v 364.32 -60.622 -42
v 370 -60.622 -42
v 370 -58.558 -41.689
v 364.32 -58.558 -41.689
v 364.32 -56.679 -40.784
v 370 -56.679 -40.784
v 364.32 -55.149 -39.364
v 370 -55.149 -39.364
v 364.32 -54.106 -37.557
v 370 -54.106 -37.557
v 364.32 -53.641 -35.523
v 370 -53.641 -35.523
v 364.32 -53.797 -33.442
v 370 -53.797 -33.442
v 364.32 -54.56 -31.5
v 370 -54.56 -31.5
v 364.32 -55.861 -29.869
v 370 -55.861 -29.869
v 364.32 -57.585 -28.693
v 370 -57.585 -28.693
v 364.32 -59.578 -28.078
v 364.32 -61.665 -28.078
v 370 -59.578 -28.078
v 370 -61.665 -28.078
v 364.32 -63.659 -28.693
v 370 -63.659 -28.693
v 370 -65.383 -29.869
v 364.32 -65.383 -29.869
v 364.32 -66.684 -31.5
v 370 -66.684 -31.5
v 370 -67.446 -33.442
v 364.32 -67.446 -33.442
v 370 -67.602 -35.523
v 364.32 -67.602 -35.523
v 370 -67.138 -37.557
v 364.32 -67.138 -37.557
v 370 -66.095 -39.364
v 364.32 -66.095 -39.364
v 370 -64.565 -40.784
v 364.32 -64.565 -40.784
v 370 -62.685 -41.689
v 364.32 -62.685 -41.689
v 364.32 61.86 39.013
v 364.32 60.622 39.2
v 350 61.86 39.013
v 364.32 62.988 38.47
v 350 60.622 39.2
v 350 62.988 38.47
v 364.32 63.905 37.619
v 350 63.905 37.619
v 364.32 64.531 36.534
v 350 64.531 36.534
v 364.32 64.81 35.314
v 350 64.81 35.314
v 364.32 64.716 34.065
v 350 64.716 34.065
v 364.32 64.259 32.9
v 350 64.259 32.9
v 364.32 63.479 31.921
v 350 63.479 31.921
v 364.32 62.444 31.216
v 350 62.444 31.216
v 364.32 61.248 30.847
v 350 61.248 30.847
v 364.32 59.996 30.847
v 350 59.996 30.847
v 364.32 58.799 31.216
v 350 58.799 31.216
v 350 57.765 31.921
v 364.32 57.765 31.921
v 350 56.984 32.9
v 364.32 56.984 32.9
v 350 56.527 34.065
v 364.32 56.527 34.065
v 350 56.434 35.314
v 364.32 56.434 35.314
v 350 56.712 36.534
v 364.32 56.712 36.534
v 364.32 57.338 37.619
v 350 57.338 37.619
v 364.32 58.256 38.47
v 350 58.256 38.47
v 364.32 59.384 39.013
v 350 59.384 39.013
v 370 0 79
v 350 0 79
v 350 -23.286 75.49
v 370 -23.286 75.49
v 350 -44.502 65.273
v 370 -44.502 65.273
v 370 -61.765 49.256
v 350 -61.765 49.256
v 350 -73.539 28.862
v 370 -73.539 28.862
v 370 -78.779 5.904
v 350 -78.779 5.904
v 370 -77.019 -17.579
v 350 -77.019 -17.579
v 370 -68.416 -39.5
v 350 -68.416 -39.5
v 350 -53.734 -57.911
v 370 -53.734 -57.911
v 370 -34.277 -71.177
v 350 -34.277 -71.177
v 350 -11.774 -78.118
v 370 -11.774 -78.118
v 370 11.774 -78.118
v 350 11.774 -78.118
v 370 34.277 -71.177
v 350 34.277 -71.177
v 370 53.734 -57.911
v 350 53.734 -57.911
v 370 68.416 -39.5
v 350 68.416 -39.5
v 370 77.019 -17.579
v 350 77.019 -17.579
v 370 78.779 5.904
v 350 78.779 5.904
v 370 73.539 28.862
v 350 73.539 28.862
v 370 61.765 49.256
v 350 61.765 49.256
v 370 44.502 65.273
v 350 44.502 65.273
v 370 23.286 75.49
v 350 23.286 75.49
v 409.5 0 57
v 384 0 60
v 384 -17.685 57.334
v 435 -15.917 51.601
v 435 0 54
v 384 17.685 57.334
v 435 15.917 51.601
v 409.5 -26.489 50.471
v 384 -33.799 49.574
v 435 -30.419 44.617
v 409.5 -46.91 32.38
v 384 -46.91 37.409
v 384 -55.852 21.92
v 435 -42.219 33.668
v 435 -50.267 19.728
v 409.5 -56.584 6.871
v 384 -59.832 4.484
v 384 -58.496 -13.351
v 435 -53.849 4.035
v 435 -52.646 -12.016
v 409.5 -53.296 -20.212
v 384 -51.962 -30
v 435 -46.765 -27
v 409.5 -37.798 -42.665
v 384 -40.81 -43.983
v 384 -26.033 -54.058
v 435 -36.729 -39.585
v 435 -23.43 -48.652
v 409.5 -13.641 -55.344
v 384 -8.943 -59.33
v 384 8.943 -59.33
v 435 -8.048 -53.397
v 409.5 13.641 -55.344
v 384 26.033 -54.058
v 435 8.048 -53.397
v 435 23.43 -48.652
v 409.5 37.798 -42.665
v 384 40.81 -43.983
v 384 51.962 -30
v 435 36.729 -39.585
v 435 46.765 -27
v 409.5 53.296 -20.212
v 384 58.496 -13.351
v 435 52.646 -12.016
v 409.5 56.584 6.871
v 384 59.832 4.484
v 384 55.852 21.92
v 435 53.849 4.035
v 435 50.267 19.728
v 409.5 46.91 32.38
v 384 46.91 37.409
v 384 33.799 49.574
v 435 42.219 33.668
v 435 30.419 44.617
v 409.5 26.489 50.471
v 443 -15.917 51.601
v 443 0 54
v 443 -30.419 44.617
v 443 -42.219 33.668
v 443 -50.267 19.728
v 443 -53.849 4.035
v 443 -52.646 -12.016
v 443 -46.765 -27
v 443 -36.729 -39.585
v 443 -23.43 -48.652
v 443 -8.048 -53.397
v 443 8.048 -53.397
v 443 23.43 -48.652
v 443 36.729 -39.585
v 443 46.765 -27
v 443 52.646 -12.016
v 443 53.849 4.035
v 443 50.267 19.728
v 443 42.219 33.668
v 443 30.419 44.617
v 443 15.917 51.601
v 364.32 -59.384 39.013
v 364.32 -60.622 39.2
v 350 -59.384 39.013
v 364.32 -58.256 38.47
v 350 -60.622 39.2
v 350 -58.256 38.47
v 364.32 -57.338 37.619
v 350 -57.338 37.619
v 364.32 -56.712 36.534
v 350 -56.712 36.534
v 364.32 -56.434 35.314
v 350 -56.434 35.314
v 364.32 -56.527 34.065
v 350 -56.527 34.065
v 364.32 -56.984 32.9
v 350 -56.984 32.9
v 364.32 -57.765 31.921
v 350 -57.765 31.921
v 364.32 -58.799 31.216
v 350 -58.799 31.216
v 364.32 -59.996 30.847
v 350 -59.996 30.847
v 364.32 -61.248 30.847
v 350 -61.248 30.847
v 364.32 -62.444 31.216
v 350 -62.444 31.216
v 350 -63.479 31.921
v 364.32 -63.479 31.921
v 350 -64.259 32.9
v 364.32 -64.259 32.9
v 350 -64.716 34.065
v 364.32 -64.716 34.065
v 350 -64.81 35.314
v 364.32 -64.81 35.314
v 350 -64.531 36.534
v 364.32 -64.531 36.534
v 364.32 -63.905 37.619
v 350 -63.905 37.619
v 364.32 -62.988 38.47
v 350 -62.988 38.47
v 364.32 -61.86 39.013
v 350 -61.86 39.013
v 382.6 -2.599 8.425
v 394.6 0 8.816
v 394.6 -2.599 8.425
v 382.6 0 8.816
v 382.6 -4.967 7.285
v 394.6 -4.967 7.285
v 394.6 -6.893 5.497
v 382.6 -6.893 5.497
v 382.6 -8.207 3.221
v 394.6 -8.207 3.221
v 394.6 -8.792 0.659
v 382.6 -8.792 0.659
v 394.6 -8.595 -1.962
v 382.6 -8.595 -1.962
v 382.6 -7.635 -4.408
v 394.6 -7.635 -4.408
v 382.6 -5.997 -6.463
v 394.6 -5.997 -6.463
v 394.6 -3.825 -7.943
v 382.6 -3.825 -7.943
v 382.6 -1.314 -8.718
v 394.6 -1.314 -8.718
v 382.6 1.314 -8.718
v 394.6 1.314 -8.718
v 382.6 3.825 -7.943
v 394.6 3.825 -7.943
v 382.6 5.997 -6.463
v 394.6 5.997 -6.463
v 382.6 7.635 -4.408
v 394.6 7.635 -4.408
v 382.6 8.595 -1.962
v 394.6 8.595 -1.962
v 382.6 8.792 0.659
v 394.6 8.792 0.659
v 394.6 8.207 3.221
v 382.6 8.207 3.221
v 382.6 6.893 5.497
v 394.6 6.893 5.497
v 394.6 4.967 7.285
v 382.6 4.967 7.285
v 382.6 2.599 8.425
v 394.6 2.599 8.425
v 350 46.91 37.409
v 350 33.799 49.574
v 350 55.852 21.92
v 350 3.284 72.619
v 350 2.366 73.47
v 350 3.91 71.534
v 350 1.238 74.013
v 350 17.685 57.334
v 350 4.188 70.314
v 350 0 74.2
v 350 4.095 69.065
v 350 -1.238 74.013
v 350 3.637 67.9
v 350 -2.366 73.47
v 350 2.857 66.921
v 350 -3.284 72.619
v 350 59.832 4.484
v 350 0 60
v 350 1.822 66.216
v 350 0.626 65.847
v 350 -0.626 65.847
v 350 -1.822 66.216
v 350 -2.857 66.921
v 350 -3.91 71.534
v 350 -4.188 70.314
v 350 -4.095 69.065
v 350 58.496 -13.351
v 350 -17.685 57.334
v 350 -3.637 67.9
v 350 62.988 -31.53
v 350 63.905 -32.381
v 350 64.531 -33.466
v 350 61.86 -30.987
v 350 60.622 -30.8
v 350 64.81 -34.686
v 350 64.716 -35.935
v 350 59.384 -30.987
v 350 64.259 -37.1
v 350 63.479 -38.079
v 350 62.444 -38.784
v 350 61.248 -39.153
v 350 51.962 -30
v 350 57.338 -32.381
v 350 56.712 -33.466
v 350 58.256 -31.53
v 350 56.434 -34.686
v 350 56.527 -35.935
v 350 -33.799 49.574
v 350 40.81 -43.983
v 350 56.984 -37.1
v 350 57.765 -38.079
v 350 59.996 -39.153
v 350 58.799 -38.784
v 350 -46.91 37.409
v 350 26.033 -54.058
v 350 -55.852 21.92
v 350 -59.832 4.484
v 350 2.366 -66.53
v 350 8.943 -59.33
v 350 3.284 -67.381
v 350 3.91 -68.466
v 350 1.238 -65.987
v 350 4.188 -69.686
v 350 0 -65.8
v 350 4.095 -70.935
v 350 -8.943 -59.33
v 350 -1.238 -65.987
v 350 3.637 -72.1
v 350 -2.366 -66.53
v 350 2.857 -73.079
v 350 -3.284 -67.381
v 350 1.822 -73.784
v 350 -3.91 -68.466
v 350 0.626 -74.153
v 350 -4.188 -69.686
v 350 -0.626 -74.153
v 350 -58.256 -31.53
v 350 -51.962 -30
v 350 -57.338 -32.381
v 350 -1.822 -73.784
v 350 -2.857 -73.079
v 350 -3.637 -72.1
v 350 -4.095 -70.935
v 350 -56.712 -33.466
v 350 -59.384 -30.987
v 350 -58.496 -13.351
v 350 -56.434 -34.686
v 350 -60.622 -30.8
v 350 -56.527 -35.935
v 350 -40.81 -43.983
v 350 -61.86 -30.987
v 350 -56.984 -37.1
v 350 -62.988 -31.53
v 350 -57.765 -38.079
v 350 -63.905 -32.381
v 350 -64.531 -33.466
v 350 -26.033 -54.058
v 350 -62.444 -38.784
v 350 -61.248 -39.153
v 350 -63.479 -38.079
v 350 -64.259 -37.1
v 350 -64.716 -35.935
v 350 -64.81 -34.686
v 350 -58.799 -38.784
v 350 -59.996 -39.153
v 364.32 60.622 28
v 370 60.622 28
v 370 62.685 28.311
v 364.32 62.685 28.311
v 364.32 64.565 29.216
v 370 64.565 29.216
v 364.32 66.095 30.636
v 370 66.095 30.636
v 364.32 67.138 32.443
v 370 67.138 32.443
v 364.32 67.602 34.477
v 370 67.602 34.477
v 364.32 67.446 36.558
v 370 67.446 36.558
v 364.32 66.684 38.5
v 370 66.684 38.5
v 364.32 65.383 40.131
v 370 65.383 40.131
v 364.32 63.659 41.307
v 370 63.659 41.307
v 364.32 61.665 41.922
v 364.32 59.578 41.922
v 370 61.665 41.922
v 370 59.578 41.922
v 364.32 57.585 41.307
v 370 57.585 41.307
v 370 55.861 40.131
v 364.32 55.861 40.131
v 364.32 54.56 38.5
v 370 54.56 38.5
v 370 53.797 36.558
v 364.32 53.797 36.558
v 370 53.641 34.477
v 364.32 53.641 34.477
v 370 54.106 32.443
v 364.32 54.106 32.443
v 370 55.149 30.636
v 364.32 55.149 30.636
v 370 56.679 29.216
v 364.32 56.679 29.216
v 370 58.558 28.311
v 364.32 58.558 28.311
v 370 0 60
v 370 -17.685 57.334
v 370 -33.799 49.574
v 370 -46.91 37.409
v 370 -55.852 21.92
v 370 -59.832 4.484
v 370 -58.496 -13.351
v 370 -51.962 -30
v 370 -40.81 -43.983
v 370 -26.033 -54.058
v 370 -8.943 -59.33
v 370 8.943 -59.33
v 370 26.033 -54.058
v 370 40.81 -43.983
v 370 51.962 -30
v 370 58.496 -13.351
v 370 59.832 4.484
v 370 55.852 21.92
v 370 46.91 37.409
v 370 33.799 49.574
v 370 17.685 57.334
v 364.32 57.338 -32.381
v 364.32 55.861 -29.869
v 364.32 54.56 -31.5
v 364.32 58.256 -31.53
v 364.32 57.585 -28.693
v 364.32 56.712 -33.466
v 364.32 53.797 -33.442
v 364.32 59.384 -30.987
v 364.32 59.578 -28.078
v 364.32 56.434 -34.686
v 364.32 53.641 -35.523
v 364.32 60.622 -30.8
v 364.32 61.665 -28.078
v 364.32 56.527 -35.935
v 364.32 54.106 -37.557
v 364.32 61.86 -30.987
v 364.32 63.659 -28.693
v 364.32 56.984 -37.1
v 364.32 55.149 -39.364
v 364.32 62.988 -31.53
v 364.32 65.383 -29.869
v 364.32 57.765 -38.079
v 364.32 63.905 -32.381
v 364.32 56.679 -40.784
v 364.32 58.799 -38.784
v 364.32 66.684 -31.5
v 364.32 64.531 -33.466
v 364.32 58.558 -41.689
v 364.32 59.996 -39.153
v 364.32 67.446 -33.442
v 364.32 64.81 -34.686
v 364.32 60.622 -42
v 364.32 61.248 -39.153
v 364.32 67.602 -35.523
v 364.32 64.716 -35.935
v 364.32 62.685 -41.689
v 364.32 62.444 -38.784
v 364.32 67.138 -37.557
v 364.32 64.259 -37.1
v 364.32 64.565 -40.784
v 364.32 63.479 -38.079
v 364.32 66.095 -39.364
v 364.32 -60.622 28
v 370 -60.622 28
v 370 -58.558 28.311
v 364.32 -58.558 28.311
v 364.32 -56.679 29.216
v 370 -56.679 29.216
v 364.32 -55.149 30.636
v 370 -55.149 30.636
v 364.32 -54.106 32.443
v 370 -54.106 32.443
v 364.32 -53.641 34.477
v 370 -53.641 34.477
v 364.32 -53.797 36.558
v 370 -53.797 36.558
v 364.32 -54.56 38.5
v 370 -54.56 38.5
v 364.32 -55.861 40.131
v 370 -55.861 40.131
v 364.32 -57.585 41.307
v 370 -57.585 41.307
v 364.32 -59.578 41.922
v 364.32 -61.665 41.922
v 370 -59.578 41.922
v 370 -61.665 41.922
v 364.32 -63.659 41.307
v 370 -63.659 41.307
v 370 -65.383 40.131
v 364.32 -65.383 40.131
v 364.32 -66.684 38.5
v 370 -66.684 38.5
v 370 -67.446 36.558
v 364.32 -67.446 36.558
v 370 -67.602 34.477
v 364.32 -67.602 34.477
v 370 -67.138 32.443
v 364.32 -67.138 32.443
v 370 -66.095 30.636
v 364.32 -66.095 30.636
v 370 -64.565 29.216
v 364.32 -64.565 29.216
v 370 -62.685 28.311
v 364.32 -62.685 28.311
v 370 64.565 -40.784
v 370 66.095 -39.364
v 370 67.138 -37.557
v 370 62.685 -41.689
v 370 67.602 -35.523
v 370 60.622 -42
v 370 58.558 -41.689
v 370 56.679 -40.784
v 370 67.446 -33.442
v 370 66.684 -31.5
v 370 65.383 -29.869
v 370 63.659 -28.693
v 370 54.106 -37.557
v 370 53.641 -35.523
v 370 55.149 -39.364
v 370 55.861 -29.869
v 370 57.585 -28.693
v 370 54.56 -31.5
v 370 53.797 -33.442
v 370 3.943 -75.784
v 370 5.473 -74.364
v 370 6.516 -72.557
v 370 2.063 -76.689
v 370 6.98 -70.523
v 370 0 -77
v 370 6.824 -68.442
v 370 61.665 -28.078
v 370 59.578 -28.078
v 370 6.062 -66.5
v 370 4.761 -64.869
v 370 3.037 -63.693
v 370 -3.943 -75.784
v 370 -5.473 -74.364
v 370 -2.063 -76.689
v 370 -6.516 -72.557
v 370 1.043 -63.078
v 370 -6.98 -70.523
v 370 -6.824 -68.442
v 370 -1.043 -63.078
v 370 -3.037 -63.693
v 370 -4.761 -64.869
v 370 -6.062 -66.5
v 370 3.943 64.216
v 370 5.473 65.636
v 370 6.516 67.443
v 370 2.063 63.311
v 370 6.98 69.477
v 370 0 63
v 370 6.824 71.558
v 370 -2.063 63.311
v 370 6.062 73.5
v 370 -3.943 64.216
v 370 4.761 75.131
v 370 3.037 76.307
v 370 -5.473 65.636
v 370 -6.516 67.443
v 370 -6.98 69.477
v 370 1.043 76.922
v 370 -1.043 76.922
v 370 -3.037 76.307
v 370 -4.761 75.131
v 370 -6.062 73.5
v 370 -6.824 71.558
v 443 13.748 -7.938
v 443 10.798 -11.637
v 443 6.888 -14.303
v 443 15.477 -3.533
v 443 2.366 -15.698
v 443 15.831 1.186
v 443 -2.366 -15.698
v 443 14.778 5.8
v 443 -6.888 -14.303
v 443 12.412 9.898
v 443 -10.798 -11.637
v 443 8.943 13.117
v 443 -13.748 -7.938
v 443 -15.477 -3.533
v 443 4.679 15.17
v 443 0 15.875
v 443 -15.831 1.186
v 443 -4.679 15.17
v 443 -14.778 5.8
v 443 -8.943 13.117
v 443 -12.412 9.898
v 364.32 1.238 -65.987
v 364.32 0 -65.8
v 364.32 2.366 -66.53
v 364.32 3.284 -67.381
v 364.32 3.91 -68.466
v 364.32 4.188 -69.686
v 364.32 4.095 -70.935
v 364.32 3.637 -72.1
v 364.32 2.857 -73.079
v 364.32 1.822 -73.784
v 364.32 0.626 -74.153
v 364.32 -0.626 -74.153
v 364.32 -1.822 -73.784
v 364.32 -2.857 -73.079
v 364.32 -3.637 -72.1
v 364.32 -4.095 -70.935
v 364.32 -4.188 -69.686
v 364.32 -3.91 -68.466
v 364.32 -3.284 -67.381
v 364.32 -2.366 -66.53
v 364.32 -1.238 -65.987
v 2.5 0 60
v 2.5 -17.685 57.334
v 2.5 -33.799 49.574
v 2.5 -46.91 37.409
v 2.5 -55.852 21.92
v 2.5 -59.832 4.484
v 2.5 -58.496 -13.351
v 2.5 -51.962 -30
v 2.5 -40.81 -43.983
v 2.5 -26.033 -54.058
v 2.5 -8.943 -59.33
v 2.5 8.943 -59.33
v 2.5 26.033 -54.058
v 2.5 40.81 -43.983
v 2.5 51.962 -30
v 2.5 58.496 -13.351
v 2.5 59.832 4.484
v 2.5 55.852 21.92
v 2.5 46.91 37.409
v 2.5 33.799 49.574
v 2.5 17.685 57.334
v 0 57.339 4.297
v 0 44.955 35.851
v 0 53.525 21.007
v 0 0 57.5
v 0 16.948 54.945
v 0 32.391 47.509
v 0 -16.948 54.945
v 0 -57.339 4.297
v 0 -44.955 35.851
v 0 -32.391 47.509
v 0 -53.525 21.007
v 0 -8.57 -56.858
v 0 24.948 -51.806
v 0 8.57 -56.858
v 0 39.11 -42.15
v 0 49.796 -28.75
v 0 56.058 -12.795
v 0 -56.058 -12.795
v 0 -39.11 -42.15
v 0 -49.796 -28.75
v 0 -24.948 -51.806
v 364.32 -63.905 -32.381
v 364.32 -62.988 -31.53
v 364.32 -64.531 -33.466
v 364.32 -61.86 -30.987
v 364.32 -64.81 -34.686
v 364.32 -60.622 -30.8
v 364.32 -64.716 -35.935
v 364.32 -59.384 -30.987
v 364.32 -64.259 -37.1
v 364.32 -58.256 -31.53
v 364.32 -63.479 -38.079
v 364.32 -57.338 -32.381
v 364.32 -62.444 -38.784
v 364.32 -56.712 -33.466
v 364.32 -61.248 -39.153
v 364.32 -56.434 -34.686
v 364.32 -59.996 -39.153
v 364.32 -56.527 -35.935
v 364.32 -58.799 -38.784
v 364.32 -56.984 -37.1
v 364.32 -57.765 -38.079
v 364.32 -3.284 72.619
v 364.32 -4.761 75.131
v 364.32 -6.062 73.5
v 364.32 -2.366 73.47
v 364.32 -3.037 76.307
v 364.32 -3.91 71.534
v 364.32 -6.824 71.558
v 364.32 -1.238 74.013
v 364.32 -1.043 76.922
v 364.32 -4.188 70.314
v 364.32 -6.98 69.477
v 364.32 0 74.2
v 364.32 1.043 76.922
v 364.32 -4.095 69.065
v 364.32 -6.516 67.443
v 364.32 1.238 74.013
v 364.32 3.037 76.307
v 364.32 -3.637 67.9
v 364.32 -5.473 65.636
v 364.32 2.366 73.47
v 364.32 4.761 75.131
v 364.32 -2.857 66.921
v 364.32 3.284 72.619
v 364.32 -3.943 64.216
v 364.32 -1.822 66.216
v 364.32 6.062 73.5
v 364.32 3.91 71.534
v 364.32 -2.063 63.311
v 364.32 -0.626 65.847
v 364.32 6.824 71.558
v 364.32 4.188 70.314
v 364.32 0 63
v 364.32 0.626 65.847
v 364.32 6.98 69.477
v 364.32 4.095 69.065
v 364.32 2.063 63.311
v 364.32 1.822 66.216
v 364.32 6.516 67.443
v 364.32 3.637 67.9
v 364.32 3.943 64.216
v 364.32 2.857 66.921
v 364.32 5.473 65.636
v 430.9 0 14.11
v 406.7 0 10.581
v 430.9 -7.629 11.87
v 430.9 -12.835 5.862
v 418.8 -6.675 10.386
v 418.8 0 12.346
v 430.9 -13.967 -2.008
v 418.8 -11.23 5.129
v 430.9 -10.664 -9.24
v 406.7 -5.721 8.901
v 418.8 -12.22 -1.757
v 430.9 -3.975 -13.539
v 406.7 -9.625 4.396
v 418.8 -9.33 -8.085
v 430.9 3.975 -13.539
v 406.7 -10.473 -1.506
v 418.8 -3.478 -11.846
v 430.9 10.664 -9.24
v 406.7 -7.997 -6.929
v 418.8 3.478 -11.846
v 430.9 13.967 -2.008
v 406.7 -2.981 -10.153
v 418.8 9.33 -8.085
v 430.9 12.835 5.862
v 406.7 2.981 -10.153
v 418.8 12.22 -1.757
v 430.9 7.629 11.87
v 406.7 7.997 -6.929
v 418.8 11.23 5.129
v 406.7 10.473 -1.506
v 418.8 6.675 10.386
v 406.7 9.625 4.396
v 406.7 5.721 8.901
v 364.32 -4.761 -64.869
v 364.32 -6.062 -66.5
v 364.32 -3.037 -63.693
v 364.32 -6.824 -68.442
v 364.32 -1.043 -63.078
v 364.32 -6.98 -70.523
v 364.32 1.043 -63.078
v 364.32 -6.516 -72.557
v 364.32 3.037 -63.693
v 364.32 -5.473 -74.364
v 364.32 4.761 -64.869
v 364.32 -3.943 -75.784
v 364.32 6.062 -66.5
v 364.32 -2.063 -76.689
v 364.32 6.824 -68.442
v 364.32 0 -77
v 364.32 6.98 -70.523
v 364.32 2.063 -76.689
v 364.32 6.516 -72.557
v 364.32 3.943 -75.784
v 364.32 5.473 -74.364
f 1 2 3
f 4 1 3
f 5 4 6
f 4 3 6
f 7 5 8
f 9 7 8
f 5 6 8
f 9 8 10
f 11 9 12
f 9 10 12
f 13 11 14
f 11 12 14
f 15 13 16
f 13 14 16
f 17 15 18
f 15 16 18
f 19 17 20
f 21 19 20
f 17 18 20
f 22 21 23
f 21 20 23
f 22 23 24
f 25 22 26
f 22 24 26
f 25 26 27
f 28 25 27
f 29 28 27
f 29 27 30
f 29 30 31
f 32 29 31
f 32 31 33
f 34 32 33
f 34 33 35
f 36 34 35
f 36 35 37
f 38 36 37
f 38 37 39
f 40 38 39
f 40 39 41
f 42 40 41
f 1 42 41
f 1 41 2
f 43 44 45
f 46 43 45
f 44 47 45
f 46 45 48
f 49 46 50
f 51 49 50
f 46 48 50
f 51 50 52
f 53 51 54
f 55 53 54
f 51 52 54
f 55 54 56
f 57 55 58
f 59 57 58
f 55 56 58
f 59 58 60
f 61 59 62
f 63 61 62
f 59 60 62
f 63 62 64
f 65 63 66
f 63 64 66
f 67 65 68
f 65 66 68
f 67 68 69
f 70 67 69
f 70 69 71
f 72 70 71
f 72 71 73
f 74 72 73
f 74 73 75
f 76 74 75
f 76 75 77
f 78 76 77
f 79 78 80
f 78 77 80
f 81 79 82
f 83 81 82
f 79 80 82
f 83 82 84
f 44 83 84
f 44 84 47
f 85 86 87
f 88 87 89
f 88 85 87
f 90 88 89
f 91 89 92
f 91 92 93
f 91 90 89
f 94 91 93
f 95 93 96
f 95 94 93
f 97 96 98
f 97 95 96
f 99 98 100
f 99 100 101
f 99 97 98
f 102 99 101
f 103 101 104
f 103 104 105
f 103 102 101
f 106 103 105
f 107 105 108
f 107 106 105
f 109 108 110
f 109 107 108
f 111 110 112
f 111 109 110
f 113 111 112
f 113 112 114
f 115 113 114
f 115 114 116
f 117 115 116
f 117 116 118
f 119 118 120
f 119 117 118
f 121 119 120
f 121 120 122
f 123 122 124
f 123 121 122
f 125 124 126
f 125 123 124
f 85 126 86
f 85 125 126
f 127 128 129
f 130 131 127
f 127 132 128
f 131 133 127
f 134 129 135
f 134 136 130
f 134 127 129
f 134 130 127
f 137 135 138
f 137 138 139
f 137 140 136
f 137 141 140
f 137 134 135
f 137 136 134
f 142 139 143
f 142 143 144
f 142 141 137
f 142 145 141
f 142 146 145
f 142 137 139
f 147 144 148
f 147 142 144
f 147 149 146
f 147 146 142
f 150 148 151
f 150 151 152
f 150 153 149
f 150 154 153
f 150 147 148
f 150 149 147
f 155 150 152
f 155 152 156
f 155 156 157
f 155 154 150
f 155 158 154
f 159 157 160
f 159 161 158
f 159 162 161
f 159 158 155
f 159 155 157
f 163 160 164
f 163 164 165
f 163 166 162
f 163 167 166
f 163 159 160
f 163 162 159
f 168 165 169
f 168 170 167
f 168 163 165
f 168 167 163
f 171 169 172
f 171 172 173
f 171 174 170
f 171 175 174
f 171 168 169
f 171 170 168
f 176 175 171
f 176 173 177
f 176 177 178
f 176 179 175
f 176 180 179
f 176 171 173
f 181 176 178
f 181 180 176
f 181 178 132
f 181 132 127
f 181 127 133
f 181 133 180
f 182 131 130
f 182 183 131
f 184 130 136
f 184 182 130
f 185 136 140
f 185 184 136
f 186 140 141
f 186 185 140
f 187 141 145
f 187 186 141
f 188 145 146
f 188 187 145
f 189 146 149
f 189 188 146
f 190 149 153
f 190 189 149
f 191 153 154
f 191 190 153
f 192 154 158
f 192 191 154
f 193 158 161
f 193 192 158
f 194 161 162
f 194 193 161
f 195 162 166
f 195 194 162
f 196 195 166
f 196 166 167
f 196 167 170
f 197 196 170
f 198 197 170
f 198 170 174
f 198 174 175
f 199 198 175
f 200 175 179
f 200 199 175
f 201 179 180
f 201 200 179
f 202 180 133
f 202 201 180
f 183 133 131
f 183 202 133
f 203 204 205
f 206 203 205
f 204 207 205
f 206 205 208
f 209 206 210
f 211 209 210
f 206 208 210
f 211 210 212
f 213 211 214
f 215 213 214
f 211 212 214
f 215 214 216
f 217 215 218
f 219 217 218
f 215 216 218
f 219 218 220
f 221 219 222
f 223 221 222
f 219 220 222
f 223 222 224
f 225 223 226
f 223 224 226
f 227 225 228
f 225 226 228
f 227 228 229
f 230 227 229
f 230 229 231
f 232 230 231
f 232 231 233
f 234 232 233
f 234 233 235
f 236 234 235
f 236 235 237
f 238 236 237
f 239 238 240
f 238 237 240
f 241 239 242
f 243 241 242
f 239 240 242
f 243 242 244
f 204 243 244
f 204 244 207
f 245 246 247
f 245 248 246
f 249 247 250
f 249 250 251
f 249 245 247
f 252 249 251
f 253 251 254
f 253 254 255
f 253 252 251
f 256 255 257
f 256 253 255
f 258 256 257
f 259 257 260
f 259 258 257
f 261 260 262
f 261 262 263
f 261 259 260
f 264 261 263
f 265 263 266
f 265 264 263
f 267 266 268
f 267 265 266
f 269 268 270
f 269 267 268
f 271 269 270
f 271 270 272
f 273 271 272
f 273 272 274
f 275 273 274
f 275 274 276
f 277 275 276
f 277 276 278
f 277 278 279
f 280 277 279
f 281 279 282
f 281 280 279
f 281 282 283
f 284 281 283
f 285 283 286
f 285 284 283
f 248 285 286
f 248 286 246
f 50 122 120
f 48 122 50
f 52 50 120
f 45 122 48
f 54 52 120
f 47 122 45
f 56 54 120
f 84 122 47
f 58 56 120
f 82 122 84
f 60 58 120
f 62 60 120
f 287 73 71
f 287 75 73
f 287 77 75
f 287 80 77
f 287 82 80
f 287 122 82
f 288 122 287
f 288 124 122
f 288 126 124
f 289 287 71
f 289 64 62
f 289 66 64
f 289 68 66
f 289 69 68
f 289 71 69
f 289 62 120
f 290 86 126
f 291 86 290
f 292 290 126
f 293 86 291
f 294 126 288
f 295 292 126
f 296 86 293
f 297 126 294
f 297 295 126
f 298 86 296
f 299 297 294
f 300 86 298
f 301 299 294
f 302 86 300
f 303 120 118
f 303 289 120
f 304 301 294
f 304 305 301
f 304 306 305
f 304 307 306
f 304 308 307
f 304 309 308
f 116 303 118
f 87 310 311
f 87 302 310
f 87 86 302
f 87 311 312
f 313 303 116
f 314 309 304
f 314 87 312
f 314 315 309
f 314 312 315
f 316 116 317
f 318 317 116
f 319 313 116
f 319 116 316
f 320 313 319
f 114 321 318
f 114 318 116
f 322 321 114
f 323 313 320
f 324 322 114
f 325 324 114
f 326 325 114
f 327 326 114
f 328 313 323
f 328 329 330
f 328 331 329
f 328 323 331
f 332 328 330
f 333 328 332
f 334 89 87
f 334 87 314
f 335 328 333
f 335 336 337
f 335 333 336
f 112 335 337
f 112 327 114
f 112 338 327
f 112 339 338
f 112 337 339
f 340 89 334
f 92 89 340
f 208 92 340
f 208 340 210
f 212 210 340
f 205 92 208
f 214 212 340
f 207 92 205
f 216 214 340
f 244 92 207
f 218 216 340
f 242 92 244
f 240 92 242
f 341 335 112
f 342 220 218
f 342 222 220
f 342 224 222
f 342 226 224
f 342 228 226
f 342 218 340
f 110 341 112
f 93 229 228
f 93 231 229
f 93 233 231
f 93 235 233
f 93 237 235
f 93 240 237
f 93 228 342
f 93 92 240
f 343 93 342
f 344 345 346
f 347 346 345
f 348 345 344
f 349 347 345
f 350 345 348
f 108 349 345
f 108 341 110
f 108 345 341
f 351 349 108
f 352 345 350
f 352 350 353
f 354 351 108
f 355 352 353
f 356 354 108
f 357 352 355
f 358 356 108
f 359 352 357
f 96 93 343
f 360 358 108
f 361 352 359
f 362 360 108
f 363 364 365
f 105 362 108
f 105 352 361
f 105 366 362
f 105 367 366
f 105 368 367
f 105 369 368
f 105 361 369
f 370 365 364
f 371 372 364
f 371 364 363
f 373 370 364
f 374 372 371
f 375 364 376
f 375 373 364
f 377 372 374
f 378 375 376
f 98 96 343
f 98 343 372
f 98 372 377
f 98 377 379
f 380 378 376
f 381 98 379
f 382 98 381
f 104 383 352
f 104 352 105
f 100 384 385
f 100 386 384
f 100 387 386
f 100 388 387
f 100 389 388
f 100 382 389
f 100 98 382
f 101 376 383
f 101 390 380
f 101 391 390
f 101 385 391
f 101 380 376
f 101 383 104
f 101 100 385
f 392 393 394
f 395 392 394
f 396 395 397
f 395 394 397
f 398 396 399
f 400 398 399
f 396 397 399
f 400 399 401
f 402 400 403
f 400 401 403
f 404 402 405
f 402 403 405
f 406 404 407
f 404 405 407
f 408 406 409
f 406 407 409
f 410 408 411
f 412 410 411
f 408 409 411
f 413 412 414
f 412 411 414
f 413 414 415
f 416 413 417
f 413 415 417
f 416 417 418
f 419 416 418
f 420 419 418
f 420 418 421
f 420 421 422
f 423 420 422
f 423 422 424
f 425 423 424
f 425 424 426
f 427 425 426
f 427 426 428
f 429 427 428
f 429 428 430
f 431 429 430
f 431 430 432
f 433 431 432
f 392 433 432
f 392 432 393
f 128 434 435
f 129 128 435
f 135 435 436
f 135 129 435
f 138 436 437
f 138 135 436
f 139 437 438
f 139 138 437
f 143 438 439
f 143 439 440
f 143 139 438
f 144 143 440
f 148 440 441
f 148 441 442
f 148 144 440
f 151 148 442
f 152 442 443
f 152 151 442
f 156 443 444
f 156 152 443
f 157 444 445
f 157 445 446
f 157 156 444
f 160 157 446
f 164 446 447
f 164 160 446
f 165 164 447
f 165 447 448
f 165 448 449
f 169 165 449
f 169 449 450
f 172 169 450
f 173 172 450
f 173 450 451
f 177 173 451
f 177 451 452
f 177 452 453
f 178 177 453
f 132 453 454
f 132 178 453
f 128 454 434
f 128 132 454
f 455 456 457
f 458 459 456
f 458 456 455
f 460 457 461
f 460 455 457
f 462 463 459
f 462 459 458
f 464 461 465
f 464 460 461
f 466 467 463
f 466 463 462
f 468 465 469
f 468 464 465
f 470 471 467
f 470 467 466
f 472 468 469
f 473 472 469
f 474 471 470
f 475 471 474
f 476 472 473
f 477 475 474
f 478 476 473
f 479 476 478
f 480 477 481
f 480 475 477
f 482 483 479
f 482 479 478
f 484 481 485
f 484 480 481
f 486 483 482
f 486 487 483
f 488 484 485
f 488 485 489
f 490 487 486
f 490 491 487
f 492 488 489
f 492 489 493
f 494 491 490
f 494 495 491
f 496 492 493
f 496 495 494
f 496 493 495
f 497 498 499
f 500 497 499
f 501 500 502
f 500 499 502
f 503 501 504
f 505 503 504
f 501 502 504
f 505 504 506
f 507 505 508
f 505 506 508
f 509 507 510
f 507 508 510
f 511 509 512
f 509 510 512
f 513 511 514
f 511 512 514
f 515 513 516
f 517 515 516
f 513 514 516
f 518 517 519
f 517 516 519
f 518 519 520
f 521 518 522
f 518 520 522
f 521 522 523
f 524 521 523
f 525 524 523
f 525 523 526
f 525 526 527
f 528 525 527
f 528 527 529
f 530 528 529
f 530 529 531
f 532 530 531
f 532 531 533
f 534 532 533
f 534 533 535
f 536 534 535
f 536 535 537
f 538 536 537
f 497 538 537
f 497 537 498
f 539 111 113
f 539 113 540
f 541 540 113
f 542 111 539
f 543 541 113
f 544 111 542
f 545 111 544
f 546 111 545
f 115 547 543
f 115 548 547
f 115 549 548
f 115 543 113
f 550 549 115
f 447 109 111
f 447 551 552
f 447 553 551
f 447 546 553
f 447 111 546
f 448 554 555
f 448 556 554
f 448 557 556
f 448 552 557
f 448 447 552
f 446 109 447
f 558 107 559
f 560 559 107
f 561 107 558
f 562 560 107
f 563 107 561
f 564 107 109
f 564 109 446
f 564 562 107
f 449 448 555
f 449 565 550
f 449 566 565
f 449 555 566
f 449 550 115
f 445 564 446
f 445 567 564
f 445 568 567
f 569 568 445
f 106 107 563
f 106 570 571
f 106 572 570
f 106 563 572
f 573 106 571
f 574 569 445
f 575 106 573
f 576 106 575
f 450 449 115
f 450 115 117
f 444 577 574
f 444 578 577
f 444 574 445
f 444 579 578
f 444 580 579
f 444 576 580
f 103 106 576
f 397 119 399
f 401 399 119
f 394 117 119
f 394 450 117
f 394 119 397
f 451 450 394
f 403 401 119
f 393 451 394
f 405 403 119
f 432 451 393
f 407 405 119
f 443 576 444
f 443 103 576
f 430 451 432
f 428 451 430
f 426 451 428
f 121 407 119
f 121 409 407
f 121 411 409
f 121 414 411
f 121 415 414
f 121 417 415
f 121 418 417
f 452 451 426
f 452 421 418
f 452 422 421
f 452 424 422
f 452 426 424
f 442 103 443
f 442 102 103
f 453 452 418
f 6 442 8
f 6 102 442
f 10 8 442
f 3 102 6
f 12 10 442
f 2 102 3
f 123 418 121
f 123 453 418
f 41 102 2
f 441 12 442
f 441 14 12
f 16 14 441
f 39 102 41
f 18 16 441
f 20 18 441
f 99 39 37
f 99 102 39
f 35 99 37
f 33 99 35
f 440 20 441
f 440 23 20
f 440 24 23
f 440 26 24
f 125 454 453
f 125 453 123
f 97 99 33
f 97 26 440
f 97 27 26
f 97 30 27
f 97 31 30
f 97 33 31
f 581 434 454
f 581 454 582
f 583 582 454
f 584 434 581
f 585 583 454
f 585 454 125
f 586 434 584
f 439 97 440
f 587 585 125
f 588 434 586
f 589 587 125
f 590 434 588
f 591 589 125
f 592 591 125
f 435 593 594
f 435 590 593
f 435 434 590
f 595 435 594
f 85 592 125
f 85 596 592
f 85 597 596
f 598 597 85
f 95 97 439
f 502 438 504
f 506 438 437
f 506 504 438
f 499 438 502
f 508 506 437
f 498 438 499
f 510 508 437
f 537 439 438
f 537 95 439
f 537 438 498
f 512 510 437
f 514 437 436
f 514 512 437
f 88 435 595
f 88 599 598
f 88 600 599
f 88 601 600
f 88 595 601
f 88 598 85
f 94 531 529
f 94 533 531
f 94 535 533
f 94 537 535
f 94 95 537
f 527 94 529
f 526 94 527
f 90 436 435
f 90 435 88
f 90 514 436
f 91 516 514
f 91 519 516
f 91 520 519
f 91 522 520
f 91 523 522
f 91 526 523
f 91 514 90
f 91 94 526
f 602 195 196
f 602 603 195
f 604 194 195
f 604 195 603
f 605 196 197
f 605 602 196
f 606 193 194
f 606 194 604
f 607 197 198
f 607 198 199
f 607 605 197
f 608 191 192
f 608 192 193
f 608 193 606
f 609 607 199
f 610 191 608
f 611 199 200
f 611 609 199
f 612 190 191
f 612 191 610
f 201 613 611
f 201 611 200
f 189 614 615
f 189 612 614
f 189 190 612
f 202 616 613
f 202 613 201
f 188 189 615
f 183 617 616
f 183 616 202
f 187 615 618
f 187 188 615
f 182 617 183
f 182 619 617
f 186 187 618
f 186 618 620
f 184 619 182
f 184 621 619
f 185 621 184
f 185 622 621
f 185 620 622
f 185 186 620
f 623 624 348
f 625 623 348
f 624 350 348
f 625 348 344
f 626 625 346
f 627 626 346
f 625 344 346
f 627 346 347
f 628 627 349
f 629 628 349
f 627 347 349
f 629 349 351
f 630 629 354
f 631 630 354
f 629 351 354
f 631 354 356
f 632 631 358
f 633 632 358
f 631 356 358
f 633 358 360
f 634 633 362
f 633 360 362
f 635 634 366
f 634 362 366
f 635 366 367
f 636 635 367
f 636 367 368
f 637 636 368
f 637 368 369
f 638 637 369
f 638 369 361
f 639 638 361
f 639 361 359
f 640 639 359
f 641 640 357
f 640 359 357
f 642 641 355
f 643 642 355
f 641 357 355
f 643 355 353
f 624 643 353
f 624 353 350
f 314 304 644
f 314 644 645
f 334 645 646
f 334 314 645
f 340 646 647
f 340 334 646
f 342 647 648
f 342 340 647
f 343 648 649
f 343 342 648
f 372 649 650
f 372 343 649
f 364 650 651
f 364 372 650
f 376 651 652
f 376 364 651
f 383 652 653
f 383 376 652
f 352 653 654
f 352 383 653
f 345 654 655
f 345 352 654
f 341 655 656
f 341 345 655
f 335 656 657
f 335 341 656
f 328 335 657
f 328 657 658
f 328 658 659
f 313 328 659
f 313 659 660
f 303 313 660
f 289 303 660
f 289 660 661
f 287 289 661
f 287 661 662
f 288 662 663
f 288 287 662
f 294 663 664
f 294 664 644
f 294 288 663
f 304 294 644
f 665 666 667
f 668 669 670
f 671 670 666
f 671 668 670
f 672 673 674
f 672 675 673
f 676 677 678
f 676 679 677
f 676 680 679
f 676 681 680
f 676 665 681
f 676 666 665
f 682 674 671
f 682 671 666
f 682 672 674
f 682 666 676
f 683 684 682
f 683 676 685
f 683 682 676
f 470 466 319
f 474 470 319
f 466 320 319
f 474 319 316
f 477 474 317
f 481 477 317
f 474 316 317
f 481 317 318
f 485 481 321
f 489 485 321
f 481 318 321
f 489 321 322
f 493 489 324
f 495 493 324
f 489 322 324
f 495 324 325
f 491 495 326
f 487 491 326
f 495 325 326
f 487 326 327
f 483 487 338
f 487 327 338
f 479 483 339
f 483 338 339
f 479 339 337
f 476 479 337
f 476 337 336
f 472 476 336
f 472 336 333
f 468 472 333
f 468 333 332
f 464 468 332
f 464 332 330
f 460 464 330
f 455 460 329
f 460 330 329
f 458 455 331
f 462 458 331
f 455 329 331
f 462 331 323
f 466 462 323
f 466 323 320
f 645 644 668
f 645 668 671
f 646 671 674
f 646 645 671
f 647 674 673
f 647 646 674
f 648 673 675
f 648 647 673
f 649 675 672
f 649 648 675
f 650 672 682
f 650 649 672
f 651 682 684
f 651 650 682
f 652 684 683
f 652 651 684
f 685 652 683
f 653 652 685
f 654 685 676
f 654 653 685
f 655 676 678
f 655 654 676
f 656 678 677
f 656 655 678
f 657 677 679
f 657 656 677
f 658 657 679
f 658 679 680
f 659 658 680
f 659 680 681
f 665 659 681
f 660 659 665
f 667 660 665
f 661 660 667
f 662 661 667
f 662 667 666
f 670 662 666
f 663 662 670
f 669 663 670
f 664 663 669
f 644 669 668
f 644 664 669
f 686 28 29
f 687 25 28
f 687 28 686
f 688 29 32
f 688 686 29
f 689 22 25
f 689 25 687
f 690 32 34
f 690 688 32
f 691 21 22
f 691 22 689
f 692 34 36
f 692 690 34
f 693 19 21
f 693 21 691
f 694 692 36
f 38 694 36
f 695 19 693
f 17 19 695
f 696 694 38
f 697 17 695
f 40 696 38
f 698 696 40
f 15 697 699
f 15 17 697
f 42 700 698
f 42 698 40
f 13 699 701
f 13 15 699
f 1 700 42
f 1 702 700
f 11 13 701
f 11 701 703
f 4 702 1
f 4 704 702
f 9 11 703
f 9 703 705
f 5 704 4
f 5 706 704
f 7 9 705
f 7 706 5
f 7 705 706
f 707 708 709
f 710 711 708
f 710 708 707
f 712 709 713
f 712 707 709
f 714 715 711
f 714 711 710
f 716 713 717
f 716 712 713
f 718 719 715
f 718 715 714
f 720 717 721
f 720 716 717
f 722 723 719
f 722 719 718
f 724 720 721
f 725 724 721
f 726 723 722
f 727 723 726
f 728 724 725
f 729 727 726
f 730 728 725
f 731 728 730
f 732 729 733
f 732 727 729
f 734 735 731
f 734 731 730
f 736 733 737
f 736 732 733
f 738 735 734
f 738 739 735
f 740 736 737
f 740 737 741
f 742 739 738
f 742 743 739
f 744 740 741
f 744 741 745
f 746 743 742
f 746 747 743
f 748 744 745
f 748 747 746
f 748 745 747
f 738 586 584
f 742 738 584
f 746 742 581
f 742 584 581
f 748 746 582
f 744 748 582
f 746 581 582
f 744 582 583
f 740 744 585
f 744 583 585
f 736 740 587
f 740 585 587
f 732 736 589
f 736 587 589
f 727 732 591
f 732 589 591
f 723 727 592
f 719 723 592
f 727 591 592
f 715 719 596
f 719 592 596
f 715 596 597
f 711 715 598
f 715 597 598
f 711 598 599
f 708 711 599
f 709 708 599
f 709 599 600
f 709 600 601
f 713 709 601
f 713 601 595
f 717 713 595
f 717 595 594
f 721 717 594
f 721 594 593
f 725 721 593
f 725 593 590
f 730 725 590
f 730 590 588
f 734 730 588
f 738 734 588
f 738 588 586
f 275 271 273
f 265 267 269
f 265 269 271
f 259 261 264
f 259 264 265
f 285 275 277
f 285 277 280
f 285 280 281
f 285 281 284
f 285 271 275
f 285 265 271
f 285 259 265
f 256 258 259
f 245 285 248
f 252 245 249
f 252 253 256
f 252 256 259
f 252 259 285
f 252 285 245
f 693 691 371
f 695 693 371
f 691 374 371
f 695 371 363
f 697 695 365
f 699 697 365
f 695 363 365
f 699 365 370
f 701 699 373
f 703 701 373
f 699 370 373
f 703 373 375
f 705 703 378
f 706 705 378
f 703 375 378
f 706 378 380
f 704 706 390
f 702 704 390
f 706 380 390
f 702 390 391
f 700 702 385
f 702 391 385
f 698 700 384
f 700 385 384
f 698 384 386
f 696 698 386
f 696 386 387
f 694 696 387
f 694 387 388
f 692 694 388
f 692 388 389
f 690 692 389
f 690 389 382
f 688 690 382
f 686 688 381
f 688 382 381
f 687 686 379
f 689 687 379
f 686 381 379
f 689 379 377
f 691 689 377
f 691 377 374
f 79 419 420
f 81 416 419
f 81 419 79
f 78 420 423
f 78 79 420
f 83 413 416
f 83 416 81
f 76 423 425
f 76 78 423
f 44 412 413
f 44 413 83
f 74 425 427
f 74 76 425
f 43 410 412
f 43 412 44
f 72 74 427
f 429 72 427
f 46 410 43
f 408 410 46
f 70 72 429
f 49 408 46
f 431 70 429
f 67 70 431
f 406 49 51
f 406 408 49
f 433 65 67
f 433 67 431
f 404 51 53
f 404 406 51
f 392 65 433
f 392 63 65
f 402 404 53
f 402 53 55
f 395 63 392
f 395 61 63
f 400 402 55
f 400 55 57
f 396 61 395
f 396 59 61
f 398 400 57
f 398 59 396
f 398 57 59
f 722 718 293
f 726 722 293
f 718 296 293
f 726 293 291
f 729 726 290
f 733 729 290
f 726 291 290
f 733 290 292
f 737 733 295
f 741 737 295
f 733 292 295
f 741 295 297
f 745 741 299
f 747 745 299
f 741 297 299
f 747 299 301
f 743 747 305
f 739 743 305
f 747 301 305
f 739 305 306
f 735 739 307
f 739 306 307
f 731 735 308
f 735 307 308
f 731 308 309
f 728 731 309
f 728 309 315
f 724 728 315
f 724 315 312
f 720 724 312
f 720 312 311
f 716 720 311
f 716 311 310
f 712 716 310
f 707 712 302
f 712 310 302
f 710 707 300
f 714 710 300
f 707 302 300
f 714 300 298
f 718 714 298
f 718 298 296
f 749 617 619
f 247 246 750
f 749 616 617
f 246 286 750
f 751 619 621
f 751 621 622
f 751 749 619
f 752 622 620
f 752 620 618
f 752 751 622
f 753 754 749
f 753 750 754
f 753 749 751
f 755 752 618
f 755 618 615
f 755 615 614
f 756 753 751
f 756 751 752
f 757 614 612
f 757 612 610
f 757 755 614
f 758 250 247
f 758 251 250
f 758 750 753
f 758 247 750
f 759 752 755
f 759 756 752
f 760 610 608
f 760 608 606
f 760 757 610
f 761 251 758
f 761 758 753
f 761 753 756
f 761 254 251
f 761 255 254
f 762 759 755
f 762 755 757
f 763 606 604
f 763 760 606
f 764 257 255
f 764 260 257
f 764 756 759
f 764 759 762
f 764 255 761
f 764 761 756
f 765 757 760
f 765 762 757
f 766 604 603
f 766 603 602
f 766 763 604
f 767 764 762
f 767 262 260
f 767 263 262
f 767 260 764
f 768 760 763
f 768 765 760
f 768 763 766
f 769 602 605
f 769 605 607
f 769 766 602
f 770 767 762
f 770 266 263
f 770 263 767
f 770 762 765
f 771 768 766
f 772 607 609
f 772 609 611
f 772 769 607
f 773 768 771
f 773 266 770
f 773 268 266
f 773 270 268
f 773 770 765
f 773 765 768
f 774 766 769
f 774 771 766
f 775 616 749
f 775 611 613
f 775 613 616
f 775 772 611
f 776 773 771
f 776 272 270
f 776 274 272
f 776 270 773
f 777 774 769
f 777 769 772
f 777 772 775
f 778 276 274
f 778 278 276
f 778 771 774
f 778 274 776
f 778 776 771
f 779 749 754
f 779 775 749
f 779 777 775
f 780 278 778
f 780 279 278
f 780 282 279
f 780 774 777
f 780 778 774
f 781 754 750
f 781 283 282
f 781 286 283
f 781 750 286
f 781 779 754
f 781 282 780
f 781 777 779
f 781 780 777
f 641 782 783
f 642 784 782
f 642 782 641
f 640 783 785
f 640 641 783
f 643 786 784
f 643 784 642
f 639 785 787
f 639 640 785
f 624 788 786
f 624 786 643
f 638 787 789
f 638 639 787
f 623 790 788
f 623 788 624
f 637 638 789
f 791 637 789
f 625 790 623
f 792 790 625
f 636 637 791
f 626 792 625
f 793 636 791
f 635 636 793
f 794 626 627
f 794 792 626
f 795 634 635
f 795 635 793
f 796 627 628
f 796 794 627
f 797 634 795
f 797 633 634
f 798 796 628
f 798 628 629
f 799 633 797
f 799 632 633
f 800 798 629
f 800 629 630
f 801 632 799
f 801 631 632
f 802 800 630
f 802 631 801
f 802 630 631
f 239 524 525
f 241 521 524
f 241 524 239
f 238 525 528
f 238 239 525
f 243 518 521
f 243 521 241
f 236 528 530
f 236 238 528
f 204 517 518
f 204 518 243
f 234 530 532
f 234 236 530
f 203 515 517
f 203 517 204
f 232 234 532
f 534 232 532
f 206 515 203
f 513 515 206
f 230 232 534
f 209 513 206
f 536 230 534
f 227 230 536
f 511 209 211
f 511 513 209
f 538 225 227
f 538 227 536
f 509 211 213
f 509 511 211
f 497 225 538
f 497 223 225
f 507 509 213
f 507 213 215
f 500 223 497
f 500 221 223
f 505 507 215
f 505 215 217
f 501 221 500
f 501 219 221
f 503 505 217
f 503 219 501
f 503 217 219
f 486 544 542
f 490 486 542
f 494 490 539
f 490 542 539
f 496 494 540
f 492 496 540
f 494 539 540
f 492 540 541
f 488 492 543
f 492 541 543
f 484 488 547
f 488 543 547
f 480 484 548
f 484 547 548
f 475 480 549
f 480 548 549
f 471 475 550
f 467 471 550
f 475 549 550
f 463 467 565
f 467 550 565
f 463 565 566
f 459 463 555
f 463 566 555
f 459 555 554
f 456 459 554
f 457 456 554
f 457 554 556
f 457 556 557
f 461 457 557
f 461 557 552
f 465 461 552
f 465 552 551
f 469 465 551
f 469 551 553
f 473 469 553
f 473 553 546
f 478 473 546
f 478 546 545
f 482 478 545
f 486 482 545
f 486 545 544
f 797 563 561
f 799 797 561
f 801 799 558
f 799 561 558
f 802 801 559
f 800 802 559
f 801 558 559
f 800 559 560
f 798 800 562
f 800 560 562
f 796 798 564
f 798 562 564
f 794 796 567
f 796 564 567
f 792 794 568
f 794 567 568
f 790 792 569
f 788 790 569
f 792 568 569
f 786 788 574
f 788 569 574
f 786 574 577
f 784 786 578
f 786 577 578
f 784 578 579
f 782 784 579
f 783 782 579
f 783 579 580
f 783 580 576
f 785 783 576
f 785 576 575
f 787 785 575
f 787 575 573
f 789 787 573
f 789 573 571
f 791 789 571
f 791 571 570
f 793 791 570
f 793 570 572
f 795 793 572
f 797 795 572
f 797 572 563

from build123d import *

# Parameters (mm, degrees)
CHAMFER1_SIZE                           = 2.5
CBORE_FOR_M8_HEX_HEAD_BOLT2_D           = 8.4
CBORE_FOR_M8_HEX_HEAD_BOLT2_CBORE_D     = 14
CBORE_FOR_M8_HEX_HEAD_BOLT2_CBORE_DEPTH = 5.68


with BuildPart() as part:
    # Sketch1 → Revolve1 (revolve)
    with BuildSketch(Plane(origin=(0, 0, 0), x_dir=(1, 0, 0), z_dir=(0, 1, 0)), mode=Mode.PRIVATE) as revolve1_sk:
        Polygon((0, 0), (0, 60), (350, 60), (350, 79), (370, 79), (370, 60), (384, 60), (435, 54), (443, 54), (443, 15.875), (394.6, 8.8165), (382.6, 8.8165), (382.6, 0), align=None)
    revolve(revolve1_sk.sketch.rotate(Axis((0, 0, 0), (1, 0, 0)), 180), axis=Axis((0, 0, 0), (1, 0, 0)))

    # Chamfer1
    chamfer1_edges = [part.edges().sort_by_distance(p)[0] for p in [
        (0, 0, -60),
    ]]
    chamfer(chamfer1_edges, length=CHAMFER1_SIZE)

    # CBORE for M8 Hex Head Bolt2 (through all)
    with Locations(Plane(origin=(370, 0, 0), x_dir=(0, 0, -1), z_dir=(1, 0, 0))):
        with Locations((-70, 0), (-35, 60.621778265), (35, 60.621778265), (70, 0), (35, -60.621778265), (-35, -60.621778265)):
            CounterBoreHole(CBORE_FOR_M8_HEX_HEAD_BOLT2_D / 2, CBORE_FOR_M8_HEX_HEAD_BOLT2_CBORE_D / 2, CBORE_FOR_M8_HEX_HEAD_BOLT2_CBORE_DEPTH)


solid = part.part
